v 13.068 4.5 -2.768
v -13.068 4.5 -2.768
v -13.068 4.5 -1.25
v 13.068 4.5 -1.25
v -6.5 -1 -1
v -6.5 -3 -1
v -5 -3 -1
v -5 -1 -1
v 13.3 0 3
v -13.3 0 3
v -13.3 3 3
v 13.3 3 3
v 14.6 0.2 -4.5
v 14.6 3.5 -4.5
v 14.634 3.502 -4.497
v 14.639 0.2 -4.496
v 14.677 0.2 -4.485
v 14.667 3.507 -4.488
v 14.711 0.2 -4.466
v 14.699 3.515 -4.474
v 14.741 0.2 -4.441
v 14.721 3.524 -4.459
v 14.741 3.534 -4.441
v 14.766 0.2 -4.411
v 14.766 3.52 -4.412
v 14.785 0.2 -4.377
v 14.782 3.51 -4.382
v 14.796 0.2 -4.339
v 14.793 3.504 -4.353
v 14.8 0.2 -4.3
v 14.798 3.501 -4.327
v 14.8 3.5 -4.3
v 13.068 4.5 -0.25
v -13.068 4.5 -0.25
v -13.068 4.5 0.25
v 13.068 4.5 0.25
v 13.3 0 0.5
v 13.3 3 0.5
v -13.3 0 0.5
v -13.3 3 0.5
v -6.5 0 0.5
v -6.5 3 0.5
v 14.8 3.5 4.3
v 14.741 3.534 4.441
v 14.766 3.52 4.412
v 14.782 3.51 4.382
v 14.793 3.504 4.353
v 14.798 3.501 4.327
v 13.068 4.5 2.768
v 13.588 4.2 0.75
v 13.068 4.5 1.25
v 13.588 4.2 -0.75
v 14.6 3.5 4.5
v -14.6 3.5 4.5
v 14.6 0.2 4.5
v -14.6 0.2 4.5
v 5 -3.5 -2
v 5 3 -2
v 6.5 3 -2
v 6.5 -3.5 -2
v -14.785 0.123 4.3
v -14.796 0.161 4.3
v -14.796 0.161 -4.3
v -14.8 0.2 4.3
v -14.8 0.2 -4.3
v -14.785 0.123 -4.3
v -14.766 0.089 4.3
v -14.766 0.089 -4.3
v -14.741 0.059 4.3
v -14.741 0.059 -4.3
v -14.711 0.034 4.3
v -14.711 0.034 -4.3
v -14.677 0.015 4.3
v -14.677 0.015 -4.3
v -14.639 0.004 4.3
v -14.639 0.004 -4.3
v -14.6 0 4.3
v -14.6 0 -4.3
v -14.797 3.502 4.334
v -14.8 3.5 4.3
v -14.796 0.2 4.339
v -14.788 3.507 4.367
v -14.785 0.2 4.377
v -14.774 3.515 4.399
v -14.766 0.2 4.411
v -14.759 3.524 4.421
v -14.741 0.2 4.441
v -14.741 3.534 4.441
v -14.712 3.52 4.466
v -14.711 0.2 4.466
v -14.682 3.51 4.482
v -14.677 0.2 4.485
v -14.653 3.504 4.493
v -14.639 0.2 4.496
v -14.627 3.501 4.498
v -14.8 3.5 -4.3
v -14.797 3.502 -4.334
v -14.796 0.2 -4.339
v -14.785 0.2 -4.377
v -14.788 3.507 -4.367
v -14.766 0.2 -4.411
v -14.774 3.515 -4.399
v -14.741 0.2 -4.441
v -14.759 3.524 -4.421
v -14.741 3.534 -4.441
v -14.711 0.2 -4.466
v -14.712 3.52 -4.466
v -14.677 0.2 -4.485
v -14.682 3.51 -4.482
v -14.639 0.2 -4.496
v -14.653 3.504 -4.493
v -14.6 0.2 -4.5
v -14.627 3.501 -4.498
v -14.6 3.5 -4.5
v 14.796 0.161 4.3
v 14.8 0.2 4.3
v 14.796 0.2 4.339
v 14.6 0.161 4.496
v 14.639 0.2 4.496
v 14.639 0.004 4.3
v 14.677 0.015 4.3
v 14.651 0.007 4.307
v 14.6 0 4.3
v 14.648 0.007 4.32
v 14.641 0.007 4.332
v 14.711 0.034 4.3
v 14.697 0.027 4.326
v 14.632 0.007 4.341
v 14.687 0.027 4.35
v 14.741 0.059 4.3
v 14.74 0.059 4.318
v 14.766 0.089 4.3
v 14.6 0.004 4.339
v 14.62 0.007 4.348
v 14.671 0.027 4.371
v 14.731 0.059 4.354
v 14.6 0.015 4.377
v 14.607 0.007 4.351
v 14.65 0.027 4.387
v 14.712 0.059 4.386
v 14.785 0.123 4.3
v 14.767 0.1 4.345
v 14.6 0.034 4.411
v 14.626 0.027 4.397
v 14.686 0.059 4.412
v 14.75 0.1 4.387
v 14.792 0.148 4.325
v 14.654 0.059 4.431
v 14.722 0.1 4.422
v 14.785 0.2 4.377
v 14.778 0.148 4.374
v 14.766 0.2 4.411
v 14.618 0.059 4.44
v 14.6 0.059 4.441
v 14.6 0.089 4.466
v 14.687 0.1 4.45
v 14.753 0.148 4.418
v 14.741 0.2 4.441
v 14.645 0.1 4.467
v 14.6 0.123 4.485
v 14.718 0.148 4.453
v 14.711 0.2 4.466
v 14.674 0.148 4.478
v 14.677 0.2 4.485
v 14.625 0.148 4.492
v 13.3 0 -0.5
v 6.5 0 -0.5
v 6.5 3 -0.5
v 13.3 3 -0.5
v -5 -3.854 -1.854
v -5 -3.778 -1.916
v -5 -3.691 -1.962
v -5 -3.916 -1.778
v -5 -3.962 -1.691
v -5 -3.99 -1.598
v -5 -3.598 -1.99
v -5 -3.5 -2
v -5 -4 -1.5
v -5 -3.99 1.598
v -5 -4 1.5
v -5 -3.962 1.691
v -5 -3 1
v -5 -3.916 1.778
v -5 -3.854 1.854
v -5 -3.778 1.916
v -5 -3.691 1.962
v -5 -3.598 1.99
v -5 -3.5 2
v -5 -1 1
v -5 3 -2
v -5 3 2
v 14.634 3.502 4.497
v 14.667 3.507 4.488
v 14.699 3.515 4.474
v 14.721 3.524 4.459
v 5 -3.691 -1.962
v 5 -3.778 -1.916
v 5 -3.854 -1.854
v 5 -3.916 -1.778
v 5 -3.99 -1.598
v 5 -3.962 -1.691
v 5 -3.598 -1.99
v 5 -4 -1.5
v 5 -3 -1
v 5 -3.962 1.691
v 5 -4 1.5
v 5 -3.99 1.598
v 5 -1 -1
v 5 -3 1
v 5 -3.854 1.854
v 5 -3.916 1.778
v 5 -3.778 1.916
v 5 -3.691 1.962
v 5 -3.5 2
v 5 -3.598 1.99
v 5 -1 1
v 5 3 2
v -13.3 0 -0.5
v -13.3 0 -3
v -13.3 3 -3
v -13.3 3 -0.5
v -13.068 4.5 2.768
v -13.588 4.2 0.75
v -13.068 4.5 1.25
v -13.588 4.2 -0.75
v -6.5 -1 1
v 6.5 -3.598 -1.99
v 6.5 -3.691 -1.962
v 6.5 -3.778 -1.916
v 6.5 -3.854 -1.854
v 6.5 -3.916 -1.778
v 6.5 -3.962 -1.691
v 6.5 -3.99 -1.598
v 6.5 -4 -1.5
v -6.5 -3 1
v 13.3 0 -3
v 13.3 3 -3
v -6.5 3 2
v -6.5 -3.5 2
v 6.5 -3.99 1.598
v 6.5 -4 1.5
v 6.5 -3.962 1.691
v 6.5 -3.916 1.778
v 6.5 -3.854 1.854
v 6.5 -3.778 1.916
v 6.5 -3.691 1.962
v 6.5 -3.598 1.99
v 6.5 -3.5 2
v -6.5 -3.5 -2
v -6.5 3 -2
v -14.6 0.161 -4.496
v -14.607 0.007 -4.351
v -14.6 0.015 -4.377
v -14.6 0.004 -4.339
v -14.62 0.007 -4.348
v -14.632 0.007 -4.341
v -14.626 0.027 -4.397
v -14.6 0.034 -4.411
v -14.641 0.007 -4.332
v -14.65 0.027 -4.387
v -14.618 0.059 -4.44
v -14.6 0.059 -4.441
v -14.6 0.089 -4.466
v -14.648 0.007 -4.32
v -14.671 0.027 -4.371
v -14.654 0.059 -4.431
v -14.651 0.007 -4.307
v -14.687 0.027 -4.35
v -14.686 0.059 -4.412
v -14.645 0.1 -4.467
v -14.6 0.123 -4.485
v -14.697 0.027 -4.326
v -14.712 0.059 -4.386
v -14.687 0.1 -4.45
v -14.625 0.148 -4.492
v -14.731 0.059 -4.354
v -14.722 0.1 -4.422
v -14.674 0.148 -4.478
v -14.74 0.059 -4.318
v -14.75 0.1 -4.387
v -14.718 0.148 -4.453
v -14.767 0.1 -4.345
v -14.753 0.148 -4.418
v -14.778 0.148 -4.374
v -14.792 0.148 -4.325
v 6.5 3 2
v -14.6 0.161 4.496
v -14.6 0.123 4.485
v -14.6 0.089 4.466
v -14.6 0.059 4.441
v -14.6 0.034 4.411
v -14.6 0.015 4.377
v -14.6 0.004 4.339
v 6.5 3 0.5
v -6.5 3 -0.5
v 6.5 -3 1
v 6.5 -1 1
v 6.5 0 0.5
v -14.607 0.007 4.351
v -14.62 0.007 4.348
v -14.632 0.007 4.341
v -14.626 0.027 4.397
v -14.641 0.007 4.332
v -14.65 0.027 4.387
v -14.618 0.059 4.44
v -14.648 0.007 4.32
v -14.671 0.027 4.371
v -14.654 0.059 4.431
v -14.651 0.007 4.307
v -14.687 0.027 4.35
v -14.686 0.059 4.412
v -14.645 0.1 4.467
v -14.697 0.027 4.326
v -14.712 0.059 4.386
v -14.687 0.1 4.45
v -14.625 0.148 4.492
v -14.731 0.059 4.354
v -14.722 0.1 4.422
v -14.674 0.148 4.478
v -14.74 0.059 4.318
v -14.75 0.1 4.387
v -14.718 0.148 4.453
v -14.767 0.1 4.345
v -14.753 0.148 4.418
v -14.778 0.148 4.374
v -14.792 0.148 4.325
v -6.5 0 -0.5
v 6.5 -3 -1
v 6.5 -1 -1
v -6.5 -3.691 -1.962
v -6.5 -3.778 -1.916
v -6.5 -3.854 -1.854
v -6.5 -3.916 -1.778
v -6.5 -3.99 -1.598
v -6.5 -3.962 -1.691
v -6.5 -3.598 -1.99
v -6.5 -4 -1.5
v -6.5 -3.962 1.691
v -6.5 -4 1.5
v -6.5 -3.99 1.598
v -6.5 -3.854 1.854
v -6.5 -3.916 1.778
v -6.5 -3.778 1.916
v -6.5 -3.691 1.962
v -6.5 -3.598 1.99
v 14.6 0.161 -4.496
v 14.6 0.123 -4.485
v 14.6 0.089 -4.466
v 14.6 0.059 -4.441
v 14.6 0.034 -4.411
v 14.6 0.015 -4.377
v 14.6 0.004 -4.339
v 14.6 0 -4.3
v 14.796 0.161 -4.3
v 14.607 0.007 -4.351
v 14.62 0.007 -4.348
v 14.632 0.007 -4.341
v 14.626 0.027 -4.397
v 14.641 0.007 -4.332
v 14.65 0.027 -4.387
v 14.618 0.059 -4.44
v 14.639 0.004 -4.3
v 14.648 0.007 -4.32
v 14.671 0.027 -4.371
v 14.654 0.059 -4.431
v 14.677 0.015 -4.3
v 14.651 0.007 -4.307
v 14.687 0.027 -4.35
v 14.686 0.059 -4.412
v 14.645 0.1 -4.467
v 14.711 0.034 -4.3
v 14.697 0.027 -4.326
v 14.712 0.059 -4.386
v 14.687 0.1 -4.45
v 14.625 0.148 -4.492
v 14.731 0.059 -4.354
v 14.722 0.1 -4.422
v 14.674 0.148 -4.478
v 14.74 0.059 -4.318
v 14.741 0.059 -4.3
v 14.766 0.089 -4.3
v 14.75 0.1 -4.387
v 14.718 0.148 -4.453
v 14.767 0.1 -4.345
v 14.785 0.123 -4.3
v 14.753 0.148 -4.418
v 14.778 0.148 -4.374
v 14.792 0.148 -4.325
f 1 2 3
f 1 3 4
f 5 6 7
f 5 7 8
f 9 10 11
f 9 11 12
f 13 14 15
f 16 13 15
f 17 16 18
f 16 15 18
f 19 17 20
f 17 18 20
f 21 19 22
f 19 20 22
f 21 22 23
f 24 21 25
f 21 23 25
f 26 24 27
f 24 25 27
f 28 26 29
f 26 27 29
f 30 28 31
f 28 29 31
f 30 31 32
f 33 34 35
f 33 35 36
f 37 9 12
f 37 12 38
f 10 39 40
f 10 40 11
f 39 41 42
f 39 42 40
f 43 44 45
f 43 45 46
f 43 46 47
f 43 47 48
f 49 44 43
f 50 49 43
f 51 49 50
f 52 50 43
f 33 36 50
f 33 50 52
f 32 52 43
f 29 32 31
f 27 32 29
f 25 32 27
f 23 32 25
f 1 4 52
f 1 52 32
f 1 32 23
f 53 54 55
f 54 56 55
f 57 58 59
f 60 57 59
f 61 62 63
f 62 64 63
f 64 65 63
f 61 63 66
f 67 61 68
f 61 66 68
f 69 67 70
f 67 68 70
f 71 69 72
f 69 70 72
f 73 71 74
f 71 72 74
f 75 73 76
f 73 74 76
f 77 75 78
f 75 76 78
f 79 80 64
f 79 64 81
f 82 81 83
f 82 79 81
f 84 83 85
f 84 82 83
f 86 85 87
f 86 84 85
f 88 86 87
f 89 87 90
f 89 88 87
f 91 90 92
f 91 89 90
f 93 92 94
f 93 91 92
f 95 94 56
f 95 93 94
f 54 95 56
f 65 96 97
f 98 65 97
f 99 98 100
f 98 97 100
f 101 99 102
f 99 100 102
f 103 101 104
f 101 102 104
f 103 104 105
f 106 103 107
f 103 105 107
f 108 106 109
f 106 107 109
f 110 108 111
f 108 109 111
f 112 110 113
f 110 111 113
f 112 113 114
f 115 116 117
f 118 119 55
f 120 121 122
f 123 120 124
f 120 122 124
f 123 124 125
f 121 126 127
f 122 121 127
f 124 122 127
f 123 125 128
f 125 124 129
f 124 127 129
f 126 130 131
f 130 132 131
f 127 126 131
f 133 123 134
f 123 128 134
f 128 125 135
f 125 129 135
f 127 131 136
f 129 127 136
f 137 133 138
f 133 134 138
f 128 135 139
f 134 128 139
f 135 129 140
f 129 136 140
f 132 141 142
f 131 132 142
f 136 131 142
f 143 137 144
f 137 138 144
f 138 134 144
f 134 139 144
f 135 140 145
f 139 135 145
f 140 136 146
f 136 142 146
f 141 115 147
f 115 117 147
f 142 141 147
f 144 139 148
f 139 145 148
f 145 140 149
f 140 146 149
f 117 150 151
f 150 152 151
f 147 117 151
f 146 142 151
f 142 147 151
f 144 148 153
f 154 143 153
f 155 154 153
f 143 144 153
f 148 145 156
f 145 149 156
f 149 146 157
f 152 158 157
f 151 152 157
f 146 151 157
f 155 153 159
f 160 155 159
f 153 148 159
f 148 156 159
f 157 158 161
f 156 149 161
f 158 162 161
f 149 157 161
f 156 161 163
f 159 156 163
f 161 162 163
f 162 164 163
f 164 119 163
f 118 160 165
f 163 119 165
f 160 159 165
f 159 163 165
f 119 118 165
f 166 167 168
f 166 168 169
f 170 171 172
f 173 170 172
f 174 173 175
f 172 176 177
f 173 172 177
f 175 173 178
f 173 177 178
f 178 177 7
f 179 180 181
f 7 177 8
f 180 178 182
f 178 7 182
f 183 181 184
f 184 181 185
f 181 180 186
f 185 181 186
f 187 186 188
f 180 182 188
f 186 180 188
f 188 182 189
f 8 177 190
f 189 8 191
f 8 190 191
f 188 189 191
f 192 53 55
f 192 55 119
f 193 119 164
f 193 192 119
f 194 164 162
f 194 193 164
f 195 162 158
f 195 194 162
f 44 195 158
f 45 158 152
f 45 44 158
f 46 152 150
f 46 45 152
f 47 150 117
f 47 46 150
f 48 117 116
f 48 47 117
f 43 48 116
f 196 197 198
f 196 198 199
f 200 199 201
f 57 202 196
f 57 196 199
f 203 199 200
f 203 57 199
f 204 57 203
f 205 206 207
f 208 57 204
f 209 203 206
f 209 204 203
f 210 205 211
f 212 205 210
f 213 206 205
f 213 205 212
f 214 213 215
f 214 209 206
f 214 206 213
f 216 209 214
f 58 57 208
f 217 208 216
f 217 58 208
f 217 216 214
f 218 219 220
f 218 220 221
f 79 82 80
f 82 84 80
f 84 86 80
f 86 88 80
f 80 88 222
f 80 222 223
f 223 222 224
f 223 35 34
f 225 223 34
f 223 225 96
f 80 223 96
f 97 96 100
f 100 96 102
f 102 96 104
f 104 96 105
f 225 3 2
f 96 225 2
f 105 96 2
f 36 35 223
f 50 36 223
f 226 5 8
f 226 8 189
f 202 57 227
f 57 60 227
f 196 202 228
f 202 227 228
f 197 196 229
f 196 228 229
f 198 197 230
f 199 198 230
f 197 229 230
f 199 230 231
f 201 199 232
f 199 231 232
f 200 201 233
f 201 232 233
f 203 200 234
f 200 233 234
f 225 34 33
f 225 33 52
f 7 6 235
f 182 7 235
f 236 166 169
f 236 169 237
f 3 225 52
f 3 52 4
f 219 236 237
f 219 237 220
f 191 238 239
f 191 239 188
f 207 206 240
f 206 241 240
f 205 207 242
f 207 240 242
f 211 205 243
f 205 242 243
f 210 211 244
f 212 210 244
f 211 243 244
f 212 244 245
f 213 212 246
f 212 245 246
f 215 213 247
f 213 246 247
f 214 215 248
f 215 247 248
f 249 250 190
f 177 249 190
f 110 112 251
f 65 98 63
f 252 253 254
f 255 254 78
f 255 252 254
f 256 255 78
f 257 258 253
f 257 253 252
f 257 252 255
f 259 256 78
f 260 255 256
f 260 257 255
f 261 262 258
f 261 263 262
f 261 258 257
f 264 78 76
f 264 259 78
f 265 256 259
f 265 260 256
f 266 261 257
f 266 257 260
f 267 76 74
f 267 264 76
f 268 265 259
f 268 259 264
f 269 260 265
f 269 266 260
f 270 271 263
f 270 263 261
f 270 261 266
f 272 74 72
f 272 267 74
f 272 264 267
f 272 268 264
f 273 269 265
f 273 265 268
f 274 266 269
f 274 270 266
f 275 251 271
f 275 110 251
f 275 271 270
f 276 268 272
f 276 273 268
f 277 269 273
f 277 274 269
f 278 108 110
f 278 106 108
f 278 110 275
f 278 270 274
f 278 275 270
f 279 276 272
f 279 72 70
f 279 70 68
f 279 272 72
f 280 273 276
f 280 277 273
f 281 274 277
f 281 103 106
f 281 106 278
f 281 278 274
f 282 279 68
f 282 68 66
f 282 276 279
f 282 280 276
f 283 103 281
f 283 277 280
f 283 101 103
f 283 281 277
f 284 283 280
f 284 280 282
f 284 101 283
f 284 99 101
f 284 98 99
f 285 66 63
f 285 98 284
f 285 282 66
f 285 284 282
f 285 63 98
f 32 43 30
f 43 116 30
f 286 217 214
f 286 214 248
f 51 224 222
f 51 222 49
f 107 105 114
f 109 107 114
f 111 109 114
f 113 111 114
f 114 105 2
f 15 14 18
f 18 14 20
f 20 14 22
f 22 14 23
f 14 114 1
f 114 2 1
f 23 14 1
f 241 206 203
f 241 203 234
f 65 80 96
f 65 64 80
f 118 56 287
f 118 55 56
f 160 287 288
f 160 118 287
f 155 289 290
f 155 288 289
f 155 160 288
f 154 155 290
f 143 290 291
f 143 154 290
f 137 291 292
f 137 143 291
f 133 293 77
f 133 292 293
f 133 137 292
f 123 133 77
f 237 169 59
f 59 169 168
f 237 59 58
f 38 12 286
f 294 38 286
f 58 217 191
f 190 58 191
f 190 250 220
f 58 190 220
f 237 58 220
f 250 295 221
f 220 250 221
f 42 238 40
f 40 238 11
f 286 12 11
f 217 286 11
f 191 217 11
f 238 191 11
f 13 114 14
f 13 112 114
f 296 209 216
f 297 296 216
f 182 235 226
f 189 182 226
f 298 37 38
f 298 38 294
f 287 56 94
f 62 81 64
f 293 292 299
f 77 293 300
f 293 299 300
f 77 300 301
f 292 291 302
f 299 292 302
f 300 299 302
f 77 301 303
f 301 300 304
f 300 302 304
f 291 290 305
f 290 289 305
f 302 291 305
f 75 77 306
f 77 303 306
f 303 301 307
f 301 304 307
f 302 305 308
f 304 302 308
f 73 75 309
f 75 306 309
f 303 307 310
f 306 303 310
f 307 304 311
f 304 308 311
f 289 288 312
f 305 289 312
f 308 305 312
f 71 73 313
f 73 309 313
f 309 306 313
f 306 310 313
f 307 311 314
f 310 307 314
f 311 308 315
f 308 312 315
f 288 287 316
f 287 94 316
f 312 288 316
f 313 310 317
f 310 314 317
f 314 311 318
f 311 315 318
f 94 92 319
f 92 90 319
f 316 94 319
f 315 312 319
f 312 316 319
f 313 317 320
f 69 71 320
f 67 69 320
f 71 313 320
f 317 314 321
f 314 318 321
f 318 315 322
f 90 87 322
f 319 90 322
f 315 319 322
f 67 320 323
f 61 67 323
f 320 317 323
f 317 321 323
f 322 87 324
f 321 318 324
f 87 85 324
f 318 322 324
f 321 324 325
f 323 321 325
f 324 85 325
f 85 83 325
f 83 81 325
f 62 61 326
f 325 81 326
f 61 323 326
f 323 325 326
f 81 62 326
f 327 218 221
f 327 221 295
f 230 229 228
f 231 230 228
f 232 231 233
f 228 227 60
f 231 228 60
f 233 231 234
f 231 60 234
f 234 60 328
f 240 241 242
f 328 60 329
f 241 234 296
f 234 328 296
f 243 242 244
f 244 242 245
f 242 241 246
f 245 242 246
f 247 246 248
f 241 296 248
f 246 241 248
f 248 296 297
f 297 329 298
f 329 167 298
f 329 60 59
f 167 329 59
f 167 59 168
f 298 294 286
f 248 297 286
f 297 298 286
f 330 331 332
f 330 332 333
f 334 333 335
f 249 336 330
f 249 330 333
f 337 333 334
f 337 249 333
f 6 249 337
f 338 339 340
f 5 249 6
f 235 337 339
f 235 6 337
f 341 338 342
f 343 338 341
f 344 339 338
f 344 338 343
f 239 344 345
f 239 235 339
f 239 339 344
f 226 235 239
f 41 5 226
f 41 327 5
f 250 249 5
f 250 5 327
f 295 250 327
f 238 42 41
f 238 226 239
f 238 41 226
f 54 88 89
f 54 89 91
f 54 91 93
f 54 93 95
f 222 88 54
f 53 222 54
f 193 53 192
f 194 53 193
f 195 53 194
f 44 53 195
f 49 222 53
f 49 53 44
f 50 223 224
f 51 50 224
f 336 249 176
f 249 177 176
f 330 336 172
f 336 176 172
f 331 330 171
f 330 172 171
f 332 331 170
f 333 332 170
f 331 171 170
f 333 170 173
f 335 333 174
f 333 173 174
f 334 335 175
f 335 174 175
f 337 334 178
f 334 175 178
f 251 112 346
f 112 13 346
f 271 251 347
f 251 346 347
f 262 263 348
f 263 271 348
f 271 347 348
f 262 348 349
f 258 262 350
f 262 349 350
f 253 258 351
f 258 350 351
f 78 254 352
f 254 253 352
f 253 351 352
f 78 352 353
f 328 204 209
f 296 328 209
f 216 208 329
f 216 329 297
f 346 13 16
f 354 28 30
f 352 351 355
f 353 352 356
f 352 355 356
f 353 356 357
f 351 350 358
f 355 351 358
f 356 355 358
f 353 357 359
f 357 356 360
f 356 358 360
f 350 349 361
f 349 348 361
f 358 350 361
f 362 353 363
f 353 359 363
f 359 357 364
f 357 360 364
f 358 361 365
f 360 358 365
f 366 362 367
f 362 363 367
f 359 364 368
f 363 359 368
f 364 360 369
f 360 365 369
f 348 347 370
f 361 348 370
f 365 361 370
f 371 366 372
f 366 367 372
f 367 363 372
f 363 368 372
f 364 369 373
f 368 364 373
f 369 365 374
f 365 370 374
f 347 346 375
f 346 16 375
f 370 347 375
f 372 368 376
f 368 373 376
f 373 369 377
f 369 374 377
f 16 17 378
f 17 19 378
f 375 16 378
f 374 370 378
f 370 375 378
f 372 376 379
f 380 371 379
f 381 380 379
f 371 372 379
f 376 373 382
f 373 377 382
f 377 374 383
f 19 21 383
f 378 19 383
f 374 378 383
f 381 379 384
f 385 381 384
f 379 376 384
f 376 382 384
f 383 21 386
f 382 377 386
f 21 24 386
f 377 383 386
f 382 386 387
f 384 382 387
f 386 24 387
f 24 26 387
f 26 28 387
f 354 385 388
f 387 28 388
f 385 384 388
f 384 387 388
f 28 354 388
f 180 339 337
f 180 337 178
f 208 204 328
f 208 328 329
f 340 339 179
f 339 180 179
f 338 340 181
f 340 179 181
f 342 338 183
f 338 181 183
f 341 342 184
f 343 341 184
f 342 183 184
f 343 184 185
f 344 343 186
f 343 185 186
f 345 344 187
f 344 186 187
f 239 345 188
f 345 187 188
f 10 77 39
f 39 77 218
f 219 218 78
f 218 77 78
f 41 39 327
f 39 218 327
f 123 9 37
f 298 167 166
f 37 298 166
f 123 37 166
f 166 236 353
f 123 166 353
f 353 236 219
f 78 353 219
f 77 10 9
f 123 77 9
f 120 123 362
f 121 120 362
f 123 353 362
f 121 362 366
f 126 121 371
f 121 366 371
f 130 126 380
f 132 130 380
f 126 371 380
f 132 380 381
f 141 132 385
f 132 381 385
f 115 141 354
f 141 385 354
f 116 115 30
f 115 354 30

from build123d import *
from OCP.BRepFilletAPI import BRepFilletAPI_MakeChamfer

# Parameters (mm, degrees)
SKETCH_1_W          = 29.6
SKETCH_1_H          = 9
EXTRUDE_1_DEPTH     = 4.5
CUT_EXTRUDE_1_DEPTH = 3
SKETCH_3_W          = 1.5
SKETCH_3_H          = 4
EXTRUDE_2_DEPTH     = 7
SKETCH_4_W          = 2
SKETCH_4_H          = 2
CUT_EXTRUDE_2_DEPTH = 23.230384612
CHAMFER_1_SIZE      = 1
CHAMFER_1_SIZE2     = 1.732050808
CHAMFER_2_SIZE      = 1
CHAMFER_2_SIZE2     = 1.732050808
CUT_EXTRUDE_3_DEPTH = 31.276393444
FILLET_2_R          = 0.2
FILLET_3_R          = 0.5


with BuildPart() as part:
    # 草图1 → 凸台-拉伸1 (new body)
    with BuildSketch(Plane(origin=(0, 0, 0), x_dir=(1, 0, 0), z_dir=(0, 1, 0))):
        Rectangle(SKETCH_1_W, SKETCH_1_H)
    extrude(amount=EXTRUDE_1_DEPTH)

    # 草图2 → 切除-拉伸1 (cut)
    with BuildSketch(Plane.XZ):
        Polygon((-13.3, 0.5), (-13.3, 3), (13.3, 3), (13.3, 0.5), (6.5, 0.5), (6.5, -0.5), (13.3, -0.5), (13.3, -3), (-13.3, -3), (-13.3, -0.5), (-6.5, -0.5), (-6.5, 0.5), align=None)
    extrude(amount=-CUT_EXTRUDE_1_DEPTH, mode=Mode.SUBTRACT)

    # 草图3 → 凸台-拉伸2 (add)
    with BuildSketch(Plane.XZ.offset(-3)):
        with Locations((-5.75, 0)):
            Rectangle(SKETCH_3_W, SKETCH_3_H)
        with Locations((5.75, 0)):
            Rectangle(SKETCH_3_W, SKETCH_3_H)
    extrude(amount=EXTRUDE_2_DEPTH)

    # 草图4 → 切除-拉伸2 (cut, through all)
    with BuildSketch(Plane.ZY.offset(6.5)):
        with Locations((0, -2)):
            Rectangle(SKETCH_4_W, SKETCH_4_H)
    extrude(amount=-CUT_EXTRUDE_2_DEPTH, mode=Mode.SUBTRACT)

    # 倒角1: one chamfer whose edges measure the first distance from different faces: ONE call of the kernel's chamfer builder (chamfer() names one face for all edges)
    chamfer_1_edges_1 = [part.edges().sort_by_distance(p)[0] for p in [
        (0, 4.5, -4.5),
    ]]
    chamfer_1_side_1 = [part.faces().sort_by_distance(p)[0] for p in [
        (0, 2.25, -4.5),
    ]]
    chamfer_1_edges_2 = [part.edges().sort_by_distance(p)[0] for p in [
        (0, 4.5, 4.5),
    ]]
    chamfer_1_side_2 = [part.faces().sort_by_distance(p)[0] for p in [
        (0, 2.25, 4.5),
    ]]
    chamfer_1 = BRepFilletAPI_MakeChamfer(part.part.solid().wrapped)
    for e in chamfer_1_edges_1:
        chamfer_1.Add(CHAMFER_1_SIZE, CHAMFER_1_SIZE2, e.wrapped, chamfer_1_side_1[0].wrapped)  # the first distance lies on this face
    for e in chamfer_1_edges_2:
        chamfer_1.Add(CHAMFER_1_SIZE, CHAMFER_1_SIZE2, e.wrapped, chamfer_1_side_2[0].wrapped)  # the first distance lies on this face
    add(Compound.cast(chamfer_1.Shape()), mode=Mode.REPLACE)

    # 倒角2: one chamfer whose edges measure the first distance from different faces: ONE call of the kernel's chamfer builder (chamfer() names one face for all edges)
    chamfer_2_edges_1 = [part.edges().sort_by_distance(p)[0] for p in [
        (-14.8, 4.5, 0),
    ]]
    chamfer_2_side_1 = [part.faces().sort_by_distance(p)[0] for p in [
        (-14.8, 2.164368335, 0),
    ]]
    chamfer_2_edges_2 = [part.edges().sort_by_distance(p)[0] for p in [
        (14.8, 4.5, 0),
    ]]
    chamfer_2_side_2 = [part.faces().sort_by_distance(p)[0] for p in [
        (14.8, 2.164368335, 0),
    ]]
    chamfer_2 = BRepFilletAPI_MakeChamfer(part.part.solid().wrapped)
    for e in chamfer_2_edges_1:
        chamfer_2.Add(CHAMFER_2_SIZE, CHAMFER_2_SIZE2, e.wrapped, chamfer_2_side_1[0].wrapped)  # the first distance lies on this face
    for e in chamfer_2_edges_2:
        chamfer_2.Add(CHAMFER_2_SIZE, CHAMFER_2_SIZE2, e.wrapped, chamfer_2_side_2[0].wrapped)  # the first distance lies on this face
    add(Compound.cast(chamfer_2.Shape()), mode=Mode.REPLACE)

    # 草图5 → 切除-拉伸3 (cut, through all)
    with BuildSketch(Plane.ZY.offset(14.8)):
        Polygon((-1.25, 4.5), (-0.25, 4.5), (-0.75, 4.2), align=None)
        Polygon((0.75, 4.2), (1.25, 4.5), (0.25, 4.5), align=None)
    extrude(amount=-CUT_EXTRUDE_3_DEPTH, mode=Mode.SUBTRACT)

    # 圆角2
    fillet_2_edges = [part.edges().sort_by_distance(p)[0] for p in [
        (-14.8, 1.75, 4.5),
        (-14.8, 1.75, -4.5),
        (14.8, 1.75, -4.5),
        (14.8, 1.75, 4.5),
        (0, 0, -4.5),
        (14.8, 0, 0),
        (0, 0, 4.5),
        (-14.8, 0, 0),
    ]]
    fillet(fillet_2_edges, radius=FILLET_2_R)

    # 圆角3
    fillet_3_edges = [part.edges().sort_by_distance(p)[0] for p in [
        (-5.75, -4, -2),
        (-5.75, -4, 2),
        (5.75, -4, -2),
        (5.75, -4, 2),
    ]]
    fillet(fillet_3_edges, radius=FILLET_3_R)


solid = part.part
